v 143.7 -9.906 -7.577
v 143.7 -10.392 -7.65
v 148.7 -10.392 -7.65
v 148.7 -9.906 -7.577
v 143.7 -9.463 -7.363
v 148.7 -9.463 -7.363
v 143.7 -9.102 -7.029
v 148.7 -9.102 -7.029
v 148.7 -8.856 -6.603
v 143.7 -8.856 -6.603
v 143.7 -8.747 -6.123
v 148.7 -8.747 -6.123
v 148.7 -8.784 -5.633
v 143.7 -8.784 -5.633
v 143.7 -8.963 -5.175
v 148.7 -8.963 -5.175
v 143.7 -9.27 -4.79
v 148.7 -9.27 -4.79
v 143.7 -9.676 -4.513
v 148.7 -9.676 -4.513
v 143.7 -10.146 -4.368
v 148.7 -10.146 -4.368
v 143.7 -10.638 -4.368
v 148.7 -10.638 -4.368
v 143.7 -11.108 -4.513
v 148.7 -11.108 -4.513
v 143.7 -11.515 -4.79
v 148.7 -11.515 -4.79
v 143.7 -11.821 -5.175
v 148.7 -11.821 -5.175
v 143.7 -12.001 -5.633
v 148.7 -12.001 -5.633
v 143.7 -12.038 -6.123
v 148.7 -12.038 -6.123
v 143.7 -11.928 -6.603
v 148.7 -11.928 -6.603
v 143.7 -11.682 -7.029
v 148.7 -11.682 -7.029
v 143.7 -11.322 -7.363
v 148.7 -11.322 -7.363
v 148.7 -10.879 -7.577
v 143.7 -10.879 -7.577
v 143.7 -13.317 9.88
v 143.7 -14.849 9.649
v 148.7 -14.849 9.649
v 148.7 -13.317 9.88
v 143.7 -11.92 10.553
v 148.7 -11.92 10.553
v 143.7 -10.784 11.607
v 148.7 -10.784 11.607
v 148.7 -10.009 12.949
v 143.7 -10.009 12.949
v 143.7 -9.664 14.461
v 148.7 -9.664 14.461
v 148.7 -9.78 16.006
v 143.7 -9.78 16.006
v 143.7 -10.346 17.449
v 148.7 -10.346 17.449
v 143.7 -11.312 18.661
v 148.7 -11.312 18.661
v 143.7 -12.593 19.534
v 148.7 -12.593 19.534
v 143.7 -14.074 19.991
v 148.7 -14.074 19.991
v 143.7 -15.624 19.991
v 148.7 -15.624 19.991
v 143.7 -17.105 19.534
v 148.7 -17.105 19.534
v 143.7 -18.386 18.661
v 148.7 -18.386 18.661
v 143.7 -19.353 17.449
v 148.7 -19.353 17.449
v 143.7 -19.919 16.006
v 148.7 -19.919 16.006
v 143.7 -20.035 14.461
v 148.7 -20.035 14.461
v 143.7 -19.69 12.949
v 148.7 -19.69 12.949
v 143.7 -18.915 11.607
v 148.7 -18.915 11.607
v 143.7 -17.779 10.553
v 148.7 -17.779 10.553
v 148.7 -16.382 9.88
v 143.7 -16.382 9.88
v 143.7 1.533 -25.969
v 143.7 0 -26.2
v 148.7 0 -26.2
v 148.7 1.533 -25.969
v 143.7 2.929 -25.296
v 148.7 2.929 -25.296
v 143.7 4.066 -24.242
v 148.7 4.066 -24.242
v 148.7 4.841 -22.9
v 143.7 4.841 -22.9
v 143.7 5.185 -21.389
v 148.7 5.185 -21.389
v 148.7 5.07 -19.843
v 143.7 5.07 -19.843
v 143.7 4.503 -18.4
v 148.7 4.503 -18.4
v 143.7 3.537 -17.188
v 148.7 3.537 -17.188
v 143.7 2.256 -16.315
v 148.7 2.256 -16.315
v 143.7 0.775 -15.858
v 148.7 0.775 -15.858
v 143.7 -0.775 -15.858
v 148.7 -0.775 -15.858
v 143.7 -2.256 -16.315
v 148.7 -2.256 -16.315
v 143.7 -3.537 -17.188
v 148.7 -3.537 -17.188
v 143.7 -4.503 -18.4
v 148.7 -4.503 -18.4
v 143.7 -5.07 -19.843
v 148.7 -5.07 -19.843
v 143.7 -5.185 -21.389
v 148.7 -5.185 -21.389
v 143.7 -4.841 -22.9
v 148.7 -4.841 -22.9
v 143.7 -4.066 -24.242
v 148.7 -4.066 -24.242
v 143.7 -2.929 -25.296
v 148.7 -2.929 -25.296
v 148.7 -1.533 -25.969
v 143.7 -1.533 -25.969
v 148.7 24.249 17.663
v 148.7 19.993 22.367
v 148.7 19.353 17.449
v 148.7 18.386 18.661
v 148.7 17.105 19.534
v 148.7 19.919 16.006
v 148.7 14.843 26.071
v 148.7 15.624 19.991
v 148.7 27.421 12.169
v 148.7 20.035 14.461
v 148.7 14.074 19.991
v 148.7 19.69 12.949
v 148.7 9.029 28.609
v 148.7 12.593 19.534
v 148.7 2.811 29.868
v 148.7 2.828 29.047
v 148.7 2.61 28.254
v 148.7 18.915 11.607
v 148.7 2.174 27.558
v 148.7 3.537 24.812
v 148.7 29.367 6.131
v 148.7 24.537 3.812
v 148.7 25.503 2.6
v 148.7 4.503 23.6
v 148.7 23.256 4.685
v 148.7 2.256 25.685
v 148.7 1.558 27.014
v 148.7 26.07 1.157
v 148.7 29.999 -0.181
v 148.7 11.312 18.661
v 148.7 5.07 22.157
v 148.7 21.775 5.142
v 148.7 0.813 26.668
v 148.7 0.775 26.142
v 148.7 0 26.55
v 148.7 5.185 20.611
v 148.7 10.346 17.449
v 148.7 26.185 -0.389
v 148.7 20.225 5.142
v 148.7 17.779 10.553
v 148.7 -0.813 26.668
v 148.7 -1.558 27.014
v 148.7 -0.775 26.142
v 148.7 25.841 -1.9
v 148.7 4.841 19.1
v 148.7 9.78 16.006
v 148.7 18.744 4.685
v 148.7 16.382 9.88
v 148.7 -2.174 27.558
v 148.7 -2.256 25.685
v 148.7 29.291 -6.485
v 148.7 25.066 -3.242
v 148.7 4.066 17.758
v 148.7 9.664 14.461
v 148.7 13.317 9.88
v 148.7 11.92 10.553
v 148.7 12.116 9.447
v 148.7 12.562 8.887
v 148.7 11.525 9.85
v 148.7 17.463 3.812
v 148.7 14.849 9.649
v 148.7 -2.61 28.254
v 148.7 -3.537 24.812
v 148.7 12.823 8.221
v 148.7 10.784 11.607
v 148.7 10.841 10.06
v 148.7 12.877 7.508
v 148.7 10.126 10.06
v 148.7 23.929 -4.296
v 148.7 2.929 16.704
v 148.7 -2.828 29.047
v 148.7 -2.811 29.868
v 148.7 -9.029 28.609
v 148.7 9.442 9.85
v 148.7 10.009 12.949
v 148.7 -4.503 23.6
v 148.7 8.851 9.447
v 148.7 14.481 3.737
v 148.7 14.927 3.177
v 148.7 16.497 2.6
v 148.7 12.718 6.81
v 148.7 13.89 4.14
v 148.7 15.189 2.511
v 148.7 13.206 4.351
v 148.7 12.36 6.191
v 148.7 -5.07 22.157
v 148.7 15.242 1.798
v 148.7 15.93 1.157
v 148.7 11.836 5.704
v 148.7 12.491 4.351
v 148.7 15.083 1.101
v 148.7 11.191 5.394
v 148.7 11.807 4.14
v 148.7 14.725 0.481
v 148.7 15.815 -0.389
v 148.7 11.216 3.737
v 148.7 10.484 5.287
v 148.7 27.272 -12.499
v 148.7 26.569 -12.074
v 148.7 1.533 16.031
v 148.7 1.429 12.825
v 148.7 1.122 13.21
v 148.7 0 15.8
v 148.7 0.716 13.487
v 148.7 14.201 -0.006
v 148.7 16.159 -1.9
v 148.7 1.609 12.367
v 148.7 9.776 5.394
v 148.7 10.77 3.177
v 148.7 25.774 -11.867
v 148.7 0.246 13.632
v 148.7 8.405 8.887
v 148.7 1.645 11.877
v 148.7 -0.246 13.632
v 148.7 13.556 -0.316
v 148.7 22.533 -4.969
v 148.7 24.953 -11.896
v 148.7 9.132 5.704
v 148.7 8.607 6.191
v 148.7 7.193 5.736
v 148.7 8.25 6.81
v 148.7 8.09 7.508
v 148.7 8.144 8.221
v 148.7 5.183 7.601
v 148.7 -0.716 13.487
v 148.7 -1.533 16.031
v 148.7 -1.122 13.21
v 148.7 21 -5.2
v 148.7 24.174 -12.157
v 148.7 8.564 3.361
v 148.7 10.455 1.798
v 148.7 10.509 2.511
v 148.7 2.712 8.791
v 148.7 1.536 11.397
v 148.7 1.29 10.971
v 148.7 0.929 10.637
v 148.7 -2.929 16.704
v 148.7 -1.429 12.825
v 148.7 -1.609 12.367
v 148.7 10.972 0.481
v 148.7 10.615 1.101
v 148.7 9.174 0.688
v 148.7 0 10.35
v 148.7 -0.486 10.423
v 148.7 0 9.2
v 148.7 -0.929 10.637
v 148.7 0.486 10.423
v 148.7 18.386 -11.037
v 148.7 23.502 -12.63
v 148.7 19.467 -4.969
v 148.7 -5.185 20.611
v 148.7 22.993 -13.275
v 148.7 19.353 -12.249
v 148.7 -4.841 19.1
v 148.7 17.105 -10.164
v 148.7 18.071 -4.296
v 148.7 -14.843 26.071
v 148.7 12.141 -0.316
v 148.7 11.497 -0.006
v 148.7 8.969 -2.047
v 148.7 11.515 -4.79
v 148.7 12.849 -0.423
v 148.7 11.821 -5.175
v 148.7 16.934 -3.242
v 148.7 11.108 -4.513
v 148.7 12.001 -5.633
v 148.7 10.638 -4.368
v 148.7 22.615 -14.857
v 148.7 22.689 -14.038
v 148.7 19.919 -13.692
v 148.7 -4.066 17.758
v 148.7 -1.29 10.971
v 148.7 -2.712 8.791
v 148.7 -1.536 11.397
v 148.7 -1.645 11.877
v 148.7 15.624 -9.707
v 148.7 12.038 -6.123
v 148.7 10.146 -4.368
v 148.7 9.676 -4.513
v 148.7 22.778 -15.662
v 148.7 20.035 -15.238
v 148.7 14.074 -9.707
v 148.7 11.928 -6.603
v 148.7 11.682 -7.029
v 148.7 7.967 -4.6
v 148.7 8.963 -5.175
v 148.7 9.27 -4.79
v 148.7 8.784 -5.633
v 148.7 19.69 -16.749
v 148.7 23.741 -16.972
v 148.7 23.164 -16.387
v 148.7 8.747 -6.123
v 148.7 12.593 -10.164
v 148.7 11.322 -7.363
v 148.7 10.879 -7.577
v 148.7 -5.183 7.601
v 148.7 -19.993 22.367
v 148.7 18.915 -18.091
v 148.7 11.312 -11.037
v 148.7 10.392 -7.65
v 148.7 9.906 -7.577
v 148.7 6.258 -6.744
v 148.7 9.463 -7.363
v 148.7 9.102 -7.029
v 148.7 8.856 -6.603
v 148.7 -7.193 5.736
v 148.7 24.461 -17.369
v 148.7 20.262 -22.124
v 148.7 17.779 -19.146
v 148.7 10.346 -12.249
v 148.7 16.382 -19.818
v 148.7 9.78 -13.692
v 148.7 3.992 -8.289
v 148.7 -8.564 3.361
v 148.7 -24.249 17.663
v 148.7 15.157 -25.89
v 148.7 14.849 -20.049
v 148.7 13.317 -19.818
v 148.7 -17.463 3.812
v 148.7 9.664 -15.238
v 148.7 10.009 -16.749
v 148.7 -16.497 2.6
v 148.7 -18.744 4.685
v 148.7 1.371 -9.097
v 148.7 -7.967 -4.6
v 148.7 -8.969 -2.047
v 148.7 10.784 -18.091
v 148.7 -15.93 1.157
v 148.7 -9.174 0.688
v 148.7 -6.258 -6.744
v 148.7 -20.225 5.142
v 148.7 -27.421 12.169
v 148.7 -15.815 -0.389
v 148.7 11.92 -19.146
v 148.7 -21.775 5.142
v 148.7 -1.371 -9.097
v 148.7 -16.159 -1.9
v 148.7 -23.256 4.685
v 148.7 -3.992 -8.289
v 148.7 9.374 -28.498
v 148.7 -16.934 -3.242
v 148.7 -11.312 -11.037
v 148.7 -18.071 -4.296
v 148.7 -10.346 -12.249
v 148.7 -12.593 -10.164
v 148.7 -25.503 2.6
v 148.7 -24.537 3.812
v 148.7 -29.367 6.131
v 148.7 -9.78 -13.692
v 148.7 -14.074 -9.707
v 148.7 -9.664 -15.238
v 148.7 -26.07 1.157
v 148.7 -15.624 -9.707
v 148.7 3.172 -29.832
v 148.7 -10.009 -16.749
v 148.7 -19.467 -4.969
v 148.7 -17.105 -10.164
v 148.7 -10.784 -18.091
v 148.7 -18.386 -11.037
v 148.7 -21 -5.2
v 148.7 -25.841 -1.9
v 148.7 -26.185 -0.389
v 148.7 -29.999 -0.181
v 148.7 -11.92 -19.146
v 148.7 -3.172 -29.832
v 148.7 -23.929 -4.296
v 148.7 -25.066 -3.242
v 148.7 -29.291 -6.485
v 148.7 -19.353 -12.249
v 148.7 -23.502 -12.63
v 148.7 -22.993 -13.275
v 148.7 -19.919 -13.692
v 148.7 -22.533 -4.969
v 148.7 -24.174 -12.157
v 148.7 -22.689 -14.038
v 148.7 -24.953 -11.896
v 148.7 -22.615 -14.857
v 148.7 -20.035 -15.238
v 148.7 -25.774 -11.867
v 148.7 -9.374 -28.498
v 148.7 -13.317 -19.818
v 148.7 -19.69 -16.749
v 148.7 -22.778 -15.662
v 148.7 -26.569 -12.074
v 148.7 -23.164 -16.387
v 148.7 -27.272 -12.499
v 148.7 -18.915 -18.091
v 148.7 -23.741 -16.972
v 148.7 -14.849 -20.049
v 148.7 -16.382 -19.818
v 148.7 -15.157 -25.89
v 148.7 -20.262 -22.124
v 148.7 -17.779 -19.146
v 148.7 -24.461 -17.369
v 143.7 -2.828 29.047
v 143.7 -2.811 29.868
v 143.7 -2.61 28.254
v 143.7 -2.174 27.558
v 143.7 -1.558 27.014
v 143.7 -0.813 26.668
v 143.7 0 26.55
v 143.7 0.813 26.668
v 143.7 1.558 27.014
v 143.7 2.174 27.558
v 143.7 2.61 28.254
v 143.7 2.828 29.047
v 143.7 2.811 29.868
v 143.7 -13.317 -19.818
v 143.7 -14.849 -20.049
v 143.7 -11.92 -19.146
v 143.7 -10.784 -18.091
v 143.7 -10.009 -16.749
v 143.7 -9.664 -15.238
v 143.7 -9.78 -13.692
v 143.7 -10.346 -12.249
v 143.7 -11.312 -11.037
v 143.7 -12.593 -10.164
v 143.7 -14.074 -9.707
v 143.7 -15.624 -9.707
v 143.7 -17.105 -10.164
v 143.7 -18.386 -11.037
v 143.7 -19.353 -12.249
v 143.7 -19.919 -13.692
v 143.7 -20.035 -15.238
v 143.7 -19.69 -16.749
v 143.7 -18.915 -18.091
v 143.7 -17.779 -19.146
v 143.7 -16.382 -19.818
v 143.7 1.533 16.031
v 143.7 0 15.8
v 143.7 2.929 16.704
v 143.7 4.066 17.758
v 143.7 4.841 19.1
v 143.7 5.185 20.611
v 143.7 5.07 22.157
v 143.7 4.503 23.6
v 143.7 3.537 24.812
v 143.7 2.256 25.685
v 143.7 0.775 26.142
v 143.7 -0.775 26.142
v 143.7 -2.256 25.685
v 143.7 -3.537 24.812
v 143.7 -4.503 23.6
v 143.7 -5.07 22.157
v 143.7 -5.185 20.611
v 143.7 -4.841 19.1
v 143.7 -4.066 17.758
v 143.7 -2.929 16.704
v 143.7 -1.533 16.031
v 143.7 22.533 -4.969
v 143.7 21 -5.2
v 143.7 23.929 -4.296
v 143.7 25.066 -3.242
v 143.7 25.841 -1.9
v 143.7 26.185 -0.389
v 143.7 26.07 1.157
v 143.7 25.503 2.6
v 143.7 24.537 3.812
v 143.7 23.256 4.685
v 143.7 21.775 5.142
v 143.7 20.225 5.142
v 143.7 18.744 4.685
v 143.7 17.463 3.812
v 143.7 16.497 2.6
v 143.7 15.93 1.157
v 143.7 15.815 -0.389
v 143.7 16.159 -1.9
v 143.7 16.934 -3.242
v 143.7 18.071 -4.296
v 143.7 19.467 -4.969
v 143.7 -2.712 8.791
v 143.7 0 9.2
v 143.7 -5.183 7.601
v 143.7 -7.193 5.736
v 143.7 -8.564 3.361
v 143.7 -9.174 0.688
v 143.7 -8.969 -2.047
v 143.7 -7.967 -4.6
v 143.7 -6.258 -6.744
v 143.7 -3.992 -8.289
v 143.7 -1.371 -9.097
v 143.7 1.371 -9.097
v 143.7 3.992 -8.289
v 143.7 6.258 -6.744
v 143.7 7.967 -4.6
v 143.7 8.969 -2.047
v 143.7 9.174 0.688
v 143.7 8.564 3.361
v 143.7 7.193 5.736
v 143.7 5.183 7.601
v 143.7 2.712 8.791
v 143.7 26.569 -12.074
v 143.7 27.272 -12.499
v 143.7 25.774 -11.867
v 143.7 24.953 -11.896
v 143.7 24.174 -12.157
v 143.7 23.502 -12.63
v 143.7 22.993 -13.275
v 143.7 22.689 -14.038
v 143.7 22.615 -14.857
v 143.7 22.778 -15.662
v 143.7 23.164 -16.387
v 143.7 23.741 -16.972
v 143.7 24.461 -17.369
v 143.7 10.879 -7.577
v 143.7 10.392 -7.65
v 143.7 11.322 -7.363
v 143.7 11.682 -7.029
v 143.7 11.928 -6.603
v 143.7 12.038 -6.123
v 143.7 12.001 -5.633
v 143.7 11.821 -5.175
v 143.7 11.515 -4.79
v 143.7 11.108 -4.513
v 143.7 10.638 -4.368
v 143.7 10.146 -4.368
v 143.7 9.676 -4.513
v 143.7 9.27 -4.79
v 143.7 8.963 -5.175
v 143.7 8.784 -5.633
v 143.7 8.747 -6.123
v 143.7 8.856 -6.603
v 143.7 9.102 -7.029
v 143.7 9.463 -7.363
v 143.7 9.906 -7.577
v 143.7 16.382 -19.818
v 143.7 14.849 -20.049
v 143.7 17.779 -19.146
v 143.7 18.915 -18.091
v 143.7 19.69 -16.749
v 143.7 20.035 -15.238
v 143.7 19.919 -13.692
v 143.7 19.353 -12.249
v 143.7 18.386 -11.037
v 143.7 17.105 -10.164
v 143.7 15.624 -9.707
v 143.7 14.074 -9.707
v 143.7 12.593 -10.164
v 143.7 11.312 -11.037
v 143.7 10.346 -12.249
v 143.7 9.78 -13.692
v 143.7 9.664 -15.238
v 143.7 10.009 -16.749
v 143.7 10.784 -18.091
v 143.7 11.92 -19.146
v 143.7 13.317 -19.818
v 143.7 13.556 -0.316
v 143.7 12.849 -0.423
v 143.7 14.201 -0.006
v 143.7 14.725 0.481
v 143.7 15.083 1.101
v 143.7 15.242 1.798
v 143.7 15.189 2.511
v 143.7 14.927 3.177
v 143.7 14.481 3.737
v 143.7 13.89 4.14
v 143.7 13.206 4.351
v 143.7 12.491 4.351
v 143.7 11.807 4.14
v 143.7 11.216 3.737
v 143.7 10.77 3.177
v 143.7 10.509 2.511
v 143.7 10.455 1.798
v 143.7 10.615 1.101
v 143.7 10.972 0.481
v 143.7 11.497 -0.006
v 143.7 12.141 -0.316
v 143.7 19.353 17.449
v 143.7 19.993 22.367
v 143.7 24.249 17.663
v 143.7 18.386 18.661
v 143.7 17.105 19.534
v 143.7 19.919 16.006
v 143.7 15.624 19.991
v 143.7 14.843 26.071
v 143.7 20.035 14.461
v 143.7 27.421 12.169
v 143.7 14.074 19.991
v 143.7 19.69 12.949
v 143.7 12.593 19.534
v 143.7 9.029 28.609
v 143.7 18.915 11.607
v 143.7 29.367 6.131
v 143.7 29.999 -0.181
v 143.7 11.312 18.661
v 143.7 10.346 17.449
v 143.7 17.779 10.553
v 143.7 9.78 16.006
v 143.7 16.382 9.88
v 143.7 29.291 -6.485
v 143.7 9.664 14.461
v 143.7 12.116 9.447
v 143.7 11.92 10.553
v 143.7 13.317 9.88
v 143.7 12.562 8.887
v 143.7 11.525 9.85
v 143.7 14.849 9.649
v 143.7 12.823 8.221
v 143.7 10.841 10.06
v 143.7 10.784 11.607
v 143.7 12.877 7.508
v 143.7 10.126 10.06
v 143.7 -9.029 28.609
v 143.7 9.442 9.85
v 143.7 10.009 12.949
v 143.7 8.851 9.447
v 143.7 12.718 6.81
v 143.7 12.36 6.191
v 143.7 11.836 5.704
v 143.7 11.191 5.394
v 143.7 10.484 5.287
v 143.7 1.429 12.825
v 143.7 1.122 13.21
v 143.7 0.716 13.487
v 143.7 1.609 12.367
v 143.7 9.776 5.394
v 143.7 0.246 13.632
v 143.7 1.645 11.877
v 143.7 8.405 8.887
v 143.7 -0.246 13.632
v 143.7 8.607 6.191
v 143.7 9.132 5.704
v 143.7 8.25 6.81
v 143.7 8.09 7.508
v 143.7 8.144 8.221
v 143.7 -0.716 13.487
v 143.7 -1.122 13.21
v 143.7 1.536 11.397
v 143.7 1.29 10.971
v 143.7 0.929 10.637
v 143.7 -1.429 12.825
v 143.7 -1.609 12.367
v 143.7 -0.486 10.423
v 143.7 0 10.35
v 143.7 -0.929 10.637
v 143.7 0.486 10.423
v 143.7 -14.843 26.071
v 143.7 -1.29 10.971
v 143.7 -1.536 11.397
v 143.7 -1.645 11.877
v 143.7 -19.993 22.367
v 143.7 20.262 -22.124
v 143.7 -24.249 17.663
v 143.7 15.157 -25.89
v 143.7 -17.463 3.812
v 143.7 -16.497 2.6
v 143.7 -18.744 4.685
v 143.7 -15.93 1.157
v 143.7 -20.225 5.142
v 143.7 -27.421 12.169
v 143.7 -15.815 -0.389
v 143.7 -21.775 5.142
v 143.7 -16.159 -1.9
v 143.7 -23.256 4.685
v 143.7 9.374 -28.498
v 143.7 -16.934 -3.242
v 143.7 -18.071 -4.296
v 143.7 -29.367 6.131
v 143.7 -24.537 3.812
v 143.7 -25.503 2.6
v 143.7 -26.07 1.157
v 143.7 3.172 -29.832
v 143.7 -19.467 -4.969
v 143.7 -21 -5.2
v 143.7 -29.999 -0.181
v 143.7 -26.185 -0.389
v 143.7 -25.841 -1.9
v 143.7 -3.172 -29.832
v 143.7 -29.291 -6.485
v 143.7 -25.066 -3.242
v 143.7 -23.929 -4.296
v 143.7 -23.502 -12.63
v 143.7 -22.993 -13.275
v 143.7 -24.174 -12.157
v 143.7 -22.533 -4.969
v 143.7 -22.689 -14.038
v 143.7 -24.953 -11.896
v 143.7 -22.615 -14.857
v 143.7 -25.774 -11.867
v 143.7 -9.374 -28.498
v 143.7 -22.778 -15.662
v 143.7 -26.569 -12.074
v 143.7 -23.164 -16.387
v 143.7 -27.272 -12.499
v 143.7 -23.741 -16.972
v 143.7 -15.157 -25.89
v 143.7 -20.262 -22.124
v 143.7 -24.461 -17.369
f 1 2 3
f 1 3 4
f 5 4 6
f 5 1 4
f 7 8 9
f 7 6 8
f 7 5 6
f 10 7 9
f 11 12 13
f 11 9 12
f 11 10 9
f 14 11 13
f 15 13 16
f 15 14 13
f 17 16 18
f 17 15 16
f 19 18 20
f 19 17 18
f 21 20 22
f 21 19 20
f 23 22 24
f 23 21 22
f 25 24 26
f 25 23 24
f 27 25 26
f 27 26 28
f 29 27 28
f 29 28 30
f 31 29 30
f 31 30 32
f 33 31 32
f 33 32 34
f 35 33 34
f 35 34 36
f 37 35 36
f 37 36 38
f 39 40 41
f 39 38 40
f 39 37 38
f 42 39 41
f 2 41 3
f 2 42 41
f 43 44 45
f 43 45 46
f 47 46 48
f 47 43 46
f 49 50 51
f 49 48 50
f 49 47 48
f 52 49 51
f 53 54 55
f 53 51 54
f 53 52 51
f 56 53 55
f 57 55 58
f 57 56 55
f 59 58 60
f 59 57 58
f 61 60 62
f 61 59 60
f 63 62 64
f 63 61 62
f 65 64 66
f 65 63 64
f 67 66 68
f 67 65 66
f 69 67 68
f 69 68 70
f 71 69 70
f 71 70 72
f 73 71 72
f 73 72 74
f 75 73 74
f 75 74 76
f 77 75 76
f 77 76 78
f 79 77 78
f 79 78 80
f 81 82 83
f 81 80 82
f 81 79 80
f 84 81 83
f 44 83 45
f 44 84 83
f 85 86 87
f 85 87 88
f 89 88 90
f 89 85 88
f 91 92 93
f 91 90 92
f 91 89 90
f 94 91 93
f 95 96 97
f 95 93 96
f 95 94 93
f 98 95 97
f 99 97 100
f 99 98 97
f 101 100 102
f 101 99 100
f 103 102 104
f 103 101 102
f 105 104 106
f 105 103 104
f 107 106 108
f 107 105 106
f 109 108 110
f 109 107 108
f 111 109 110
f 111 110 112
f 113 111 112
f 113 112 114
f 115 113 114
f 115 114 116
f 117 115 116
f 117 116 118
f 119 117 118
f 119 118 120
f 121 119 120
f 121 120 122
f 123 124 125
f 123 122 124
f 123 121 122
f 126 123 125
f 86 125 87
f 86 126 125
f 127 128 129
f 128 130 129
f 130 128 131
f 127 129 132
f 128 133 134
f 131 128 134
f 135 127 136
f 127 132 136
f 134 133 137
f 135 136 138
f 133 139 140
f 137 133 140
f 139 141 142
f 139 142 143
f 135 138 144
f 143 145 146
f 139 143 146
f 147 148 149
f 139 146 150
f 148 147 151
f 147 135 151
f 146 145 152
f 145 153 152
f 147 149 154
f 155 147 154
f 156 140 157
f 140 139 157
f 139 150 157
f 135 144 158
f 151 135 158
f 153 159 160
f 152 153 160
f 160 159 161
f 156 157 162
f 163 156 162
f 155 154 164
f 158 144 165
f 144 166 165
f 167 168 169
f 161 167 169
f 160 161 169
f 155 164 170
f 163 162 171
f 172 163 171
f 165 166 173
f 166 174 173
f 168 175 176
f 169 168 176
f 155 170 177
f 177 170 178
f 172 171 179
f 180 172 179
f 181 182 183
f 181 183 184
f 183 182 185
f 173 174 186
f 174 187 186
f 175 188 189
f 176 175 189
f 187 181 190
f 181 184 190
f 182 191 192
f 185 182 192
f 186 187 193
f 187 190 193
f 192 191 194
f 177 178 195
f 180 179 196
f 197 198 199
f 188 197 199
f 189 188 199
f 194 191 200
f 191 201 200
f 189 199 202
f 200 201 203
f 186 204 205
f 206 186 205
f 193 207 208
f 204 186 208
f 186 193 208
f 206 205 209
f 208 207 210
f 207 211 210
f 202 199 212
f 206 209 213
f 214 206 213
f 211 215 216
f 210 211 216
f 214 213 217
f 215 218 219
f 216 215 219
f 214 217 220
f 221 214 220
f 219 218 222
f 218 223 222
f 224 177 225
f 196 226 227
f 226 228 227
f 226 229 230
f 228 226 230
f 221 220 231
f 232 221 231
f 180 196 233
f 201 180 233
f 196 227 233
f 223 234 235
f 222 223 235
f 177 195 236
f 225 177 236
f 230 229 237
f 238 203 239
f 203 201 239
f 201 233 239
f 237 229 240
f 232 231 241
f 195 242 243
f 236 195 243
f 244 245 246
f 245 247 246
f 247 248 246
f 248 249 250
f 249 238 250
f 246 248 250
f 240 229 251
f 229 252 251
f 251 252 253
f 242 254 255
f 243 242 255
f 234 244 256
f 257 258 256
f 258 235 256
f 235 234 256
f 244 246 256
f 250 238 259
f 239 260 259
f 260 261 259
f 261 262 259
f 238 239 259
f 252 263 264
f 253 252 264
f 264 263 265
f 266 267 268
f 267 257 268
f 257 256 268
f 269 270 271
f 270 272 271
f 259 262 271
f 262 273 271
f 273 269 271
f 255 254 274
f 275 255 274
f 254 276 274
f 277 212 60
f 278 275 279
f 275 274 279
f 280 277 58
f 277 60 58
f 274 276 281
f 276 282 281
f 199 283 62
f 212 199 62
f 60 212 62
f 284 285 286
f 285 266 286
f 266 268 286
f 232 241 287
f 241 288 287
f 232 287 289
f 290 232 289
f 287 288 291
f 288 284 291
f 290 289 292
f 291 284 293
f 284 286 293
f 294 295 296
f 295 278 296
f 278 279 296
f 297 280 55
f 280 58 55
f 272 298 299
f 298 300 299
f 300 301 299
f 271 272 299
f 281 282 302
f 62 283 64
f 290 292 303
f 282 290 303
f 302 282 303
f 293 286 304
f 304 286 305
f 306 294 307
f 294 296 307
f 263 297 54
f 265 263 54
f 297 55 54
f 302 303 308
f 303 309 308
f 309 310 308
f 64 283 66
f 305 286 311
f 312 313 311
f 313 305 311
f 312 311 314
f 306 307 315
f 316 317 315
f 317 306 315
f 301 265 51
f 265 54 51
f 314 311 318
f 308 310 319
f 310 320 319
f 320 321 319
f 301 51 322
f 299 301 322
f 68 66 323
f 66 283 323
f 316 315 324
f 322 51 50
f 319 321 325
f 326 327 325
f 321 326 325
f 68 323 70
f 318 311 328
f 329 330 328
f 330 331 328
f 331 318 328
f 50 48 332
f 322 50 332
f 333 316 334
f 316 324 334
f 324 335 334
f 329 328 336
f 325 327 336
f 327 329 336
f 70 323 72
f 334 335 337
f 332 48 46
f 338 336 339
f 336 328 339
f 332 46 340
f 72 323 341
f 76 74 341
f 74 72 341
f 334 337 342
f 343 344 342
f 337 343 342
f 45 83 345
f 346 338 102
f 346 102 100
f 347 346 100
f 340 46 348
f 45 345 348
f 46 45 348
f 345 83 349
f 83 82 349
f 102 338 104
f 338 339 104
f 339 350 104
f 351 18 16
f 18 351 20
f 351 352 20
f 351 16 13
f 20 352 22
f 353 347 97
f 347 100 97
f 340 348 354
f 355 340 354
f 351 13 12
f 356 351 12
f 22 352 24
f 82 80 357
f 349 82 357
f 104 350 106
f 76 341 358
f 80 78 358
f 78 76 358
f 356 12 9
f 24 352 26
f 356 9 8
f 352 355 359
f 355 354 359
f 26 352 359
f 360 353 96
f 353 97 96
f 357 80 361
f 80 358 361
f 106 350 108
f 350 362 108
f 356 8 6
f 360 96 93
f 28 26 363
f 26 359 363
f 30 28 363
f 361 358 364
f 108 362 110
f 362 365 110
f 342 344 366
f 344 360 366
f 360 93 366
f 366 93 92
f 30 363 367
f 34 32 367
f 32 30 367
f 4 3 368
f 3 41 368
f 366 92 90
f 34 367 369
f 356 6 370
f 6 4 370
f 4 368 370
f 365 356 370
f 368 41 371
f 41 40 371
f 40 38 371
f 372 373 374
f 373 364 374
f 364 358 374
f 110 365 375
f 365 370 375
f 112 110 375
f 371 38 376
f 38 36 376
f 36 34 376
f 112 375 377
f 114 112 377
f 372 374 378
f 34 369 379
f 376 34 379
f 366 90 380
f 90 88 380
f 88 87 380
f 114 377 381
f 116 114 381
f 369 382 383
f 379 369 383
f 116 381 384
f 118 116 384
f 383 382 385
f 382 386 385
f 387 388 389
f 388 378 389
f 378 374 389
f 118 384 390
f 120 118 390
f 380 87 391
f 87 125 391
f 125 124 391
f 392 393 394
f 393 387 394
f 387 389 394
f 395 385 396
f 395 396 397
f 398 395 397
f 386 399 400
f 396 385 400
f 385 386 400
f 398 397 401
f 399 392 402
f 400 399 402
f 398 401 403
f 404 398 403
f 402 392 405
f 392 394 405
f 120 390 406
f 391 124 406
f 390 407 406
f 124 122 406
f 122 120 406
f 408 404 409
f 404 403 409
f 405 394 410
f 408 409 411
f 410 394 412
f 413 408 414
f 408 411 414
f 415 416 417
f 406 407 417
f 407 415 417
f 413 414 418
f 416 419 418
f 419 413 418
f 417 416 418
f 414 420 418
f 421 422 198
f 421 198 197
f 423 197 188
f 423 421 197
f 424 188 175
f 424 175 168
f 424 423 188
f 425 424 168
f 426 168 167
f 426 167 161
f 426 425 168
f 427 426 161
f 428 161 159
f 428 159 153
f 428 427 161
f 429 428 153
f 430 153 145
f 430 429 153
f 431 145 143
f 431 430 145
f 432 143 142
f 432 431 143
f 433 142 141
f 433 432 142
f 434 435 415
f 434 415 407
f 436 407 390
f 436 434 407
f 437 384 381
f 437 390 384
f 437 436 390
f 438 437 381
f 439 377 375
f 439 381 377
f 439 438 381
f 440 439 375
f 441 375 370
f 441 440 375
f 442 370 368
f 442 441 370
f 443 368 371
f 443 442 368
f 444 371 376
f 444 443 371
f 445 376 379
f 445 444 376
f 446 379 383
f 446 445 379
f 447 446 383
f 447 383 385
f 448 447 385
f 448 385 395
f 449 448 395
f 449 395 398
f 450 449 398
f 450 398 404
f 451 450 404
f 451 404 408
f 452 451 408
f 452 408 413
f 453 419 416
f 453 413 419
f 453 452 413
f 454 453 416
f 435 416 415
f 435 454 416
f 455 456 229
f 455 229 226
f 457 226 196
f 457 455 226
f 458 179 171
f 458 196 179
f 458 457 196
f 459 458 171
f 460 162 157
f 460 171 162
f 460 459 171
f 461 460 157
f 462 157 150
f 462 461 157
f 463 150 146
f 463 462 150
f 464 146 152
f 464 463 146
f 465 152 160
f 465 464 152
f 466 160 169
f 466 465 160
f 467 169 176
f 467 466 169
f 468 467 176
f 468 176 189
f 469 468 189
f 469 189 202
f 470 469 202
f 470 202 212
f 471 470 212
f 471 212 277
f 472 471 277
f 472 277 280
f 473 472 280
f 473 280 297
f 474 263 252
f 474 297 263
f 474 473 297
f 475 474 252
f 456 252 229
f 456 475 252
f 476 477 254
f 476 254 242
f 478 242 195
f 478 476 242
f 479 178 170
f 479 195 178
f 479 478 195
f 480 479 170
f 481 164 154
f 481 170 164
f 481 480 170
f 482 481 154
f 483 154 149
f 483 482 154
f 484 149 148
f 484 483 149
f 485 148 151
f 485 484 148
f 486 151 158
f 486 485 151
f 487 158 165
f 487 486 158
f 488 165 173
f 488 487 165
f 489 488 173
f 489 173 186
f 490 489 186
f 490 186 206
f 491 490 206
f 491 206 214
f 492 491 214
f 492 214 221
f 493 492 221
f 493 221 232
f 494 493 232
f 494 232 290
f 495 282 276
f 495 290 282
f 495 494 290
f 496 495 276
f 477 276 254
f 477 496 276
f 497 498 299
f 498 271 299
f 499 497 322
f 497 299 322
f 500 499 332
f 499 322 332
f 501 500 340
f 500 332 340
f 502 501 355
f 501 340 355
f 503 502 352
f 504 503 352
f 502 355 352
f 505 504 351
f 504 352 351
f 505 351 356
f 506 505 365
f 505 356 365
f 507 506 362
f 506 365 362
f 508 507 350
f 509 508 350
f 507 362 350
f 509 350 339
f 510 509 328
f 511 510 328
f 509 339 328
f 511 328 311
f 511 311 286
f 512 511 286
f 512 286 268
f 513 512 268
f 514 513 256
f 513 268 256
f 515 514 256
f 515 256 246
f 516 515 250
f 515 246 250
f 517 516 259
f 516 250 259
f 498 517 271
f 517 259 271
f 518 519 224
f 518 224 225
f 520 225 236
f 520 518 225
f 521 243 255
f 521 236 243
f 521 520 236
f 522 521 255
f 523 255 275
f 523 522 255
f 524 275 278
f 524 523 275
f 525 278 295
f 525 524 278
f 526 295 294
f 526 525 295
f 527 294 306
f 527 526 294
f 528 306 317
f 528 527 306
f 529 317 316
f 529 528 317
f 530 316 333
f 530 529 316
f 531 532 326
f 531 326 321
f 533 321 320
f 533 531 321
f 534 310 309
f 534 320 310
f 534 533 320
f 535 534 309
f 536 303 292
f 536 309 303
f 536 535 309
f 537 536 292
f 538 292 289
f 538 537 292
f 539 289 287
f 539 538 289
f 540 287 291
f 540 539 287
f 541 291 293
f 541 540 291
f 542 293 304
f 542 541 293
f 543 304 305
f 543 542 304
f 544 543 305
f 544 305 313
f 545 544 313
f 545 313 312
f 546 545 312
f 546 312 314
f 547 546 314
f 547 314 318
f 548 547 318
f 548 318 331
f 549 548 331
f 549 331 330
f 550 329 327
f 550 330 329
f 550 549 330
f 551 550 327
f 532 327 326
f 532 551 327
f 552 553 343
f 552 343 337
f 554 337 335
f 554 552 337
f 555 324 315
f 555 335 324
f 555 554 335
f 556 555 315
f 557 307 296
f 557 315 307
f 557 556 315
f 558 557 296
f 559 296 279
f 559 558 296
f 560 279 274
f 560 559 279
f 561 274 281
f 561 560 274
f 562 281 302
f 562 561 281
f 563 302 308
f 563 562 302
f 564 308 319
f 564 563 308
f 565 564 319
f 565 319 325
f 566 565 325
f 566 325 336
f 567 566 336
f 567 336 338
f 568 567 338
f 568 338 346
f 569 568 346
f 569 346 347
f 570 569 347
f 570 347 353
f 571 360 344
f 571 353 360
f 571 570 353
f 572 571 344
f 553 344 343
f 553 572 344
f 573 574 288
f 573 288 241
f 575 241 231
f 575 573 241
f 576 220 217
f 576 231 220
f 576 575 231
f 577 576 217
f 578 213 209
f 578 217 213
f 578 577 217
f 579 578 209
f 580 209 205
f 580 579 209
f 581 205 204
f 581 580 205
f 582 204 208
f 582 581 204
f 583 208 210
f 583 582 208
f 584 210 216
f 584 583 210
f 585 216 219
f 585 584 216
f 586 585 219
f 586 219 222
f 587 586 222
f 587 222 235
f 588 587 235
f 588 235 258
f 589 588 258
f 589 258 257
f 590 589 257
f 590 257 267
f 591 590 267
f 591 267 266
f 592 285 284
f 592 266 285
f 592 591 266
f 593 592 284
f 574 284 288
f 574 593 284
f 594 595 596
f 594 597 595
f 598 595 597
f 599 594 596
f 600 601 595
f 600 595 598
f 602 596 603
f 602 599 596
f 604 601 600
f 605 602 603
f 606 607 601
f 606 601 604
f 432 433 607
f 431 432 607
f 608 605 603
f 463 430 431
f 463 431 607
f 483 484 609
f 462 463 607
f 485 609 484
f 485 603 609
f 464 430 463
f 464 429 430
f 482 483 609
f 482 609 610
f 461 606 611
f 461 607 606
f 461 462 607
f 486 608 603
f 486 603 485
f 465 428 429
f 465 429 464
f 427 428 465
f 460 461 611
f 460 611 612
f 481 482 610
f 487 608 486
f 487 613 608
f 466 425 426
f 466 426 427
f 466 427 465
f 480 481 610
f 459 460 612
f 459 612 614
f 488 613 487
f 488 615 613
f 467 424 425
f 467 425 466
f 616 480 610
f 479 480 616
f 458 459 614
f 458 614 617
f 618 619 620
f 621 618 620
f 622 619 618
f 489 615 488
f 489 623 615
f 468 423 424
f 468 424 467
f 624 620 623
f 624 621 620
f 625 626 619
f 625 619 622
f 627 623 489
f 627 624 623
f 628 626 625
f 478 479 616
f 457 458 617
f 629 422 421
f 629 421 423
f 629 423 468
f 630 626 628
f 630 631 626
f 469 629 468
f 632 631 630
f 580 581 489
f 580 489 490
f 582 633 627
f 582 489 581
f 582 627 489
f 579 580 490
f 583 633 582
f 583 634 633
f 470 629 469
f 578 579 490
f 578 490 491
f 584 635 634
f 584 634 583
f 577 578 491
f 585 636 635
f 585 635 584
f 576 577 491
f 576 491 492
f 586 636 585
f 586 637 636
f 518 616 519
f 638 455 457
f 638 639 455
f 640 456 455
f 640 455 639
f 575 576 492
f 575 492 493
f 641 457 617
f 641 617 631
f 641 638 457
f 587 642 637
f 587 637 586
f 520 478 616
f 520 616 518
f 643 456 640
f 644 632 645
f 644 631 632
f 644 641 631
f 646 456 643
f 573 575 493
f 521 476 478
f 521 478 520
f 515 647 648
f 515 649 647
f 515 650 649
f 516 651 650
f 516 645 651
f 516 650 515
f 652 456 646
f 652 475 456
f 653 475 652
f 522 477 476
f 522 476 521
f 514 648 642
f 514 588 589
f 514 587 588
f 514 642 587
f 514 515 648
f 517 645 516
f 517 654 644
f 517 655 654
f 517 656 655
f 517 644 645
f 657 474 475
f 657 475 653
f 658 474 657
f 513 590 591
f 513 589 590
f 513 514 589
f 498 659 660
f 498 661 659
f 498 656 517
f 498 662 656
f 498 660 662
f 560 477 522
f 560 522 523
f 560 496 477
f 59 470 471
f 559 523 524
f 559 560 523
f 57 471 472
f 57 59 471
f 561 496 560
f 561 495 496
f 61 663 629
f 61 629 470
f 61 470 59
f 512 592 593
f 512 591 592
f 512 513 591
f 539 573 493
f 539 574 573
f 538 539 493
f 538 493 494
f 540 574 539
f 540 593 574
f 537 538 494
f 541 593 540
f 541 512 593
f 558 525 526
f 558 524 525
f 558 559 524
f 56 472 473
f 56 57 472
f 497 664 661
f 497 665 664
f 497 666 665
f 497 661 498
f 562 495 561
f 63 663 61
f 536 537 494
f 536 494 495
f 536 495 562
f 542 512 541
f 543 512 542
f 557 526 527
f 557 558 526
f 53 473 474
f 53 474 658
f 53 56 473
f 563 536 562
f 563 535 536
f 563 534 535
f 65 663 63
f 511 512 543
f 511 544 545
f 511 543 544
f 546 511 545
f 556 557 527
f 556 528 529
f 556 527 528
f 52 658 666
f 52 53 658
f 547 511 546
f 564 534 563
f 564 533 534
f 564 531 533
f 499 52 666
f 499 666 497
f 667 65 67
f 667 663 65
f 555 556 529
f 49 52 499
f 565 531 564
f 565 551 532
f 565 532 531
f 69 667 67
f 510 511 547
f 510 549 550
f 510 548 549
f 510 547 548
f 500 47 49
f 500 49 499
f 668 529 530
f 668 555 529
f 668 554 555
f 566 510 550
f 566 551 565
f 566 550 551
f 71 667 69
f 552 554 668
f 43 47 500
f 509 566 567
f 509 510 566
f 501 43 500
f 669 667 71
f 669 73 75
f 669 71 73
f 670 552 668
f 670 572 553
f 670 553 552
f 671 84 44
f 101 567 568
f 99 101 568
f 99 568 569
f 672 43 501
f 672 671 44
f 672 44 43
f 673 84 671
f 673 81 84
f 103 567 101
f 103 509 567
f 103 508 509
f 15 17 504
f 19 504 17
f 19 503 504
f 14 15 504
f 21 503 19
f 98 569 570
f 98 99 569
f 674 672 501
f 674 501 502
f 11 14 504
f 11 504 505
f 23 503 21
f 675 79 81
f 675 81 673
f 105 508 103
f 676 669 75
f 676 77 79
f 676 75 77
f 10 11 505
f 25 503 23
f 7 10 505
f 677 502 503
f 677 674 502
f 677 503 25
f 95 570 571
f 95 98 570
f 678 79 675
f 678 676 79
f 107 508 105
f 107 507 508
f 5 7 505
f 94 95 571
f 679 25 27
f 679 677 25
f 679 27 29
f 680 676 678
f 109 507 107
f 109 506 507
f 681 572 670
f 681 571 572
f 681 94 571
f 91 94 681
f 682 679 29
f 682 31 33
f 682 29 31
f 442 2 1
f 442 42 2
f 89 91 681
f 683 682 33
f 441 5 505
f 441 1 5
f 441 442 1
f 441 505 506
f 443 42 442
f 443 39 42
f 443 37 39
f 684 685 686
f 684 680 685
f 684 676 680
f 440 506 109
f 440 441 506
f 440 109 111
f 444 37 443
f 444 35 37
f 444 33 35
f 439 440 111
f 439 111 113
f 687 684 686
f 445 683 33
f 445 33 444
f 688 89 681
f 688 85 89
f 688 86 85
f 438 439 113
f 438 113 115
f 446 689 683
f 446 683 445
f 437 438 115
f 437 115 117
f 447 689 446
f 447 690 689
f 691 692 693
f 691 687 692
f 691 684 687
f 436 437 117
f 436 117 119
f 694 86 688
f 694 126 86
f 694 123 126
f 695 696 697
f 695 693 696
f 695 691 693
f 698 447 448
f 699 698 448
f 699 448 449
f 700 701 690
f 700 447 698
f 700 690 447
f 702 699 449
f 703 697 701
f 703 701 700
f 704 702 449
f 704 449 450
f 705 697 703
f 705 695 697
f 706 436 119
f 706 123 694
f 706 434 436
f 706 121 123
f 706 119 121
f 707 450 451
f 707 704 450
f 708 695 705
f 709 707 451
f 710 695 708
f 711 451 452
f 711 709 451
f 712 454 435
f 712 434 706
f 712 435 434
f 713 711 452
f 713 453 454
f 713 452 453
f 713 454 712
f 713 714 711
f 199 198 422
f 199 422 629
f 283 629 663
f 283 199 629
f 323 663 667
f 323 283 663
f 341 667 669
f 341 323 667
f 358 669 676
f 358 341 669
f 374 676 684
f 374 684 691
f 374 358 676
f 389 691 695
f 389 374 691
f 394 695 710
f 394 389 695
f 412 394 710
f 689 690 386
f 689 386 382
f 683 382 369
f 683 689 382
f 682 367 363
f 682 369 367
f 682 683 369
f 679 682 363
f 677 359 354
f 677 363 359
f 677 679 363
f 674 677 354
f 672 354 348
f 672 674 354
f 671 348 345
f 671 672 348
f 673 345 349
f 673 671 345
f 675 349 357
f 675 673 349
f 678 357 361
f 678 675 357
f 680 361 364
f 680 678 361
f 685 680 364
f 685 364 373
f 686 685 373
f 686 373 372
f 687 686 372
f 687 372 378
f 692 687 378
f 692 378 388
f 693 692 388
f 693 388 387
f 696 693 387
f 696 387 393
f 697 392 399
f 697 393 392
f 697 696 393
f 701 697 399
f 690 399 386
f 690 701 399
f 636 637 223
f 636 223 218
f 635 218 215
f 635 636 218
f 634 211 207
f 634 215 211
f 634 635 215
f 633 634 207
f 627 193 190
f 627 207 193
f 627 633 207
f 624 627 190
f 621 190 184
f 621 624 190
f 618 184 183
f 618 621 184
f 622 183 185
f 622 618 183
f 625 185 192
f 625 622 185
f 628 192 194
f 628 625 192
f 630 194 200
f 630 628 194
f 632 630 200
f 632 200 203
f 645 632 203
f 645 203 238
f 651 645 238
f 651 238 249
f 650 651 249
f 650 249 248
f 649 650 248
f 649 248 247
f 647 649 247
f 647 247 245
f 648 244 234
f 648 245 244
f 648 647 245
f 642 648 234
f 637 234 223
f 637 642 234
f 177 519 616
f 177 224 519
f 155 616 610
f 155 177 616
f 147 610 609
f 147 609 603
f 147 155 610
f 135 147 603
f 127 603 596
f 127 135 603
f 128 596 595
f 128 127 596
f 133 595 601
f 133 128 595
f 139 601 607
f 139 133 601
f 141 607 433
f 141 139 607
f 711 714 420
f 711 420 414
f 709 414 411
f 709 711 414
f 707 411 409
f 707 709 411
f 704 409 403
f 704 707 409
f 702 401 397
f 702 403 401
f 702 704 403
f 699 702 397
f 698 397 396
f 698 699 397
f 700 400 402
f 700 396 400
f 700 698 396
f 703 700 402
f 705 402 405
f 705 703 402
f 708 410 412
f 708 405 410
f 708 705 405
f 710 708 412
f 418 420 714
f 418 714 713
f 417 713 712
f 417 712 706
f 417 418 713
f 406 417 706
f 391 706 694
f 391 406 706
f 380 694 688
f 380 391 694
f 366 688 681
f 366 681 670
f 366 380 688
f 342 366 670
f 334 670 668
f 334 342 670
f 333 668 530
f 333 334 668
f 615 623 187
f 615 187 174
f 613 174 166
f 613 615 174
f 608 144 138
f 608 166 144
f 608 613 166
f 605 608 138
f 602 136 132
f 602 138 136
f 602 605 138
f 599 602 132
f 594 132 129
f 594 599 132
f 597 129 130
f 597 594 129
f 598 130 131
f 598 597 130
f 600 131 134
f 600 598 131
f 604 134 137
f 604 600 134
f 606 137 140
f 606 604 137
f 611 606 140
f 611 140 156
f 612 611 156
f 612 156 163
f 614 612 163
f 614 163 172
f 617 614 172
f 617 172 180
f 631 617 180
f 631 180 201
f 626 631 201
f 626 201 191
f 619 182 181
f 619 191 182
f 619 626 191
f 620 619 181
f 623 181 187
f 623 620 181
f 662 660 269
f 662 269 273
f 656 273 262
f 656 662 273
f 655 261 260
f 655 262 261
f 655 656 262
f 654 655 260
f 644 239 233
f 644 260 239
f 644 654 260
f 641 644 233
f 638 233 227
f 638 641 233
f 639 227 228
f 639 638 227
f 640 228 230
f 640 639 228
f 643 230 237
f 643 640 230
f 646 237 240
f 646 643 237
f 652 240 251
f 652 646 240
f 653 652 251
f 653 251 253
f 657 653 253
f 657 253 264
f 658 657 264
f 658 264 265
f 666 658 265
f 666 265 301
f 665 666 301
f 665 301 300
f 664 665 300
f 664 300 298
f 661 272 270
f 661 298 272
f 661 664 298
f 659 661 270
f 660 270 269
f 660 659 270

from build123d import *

# Parameters (mm, degrees)
AXIAL_PROFILE_MM_W     = 5
AXIAL_PROFILE_MM_H     = 20.8
AXIAL_HOLES_DEPTH      = 155.634051877
AXIAL_HOLES_DEPTH_BACK = 155.634051877
SKETCH2_R              = 5.2
SKETCH2_R_2            = 2.4
SKETCH2_R_3            = 1.65
SKETCH2_R_4            = 2.85


with BuildPart() as part:
    # Axial profile (mm) → Full revolution (revolve)
    with BuildSketch(Plane.XY, mode=Mode.PRIVATE) as full_revolution_sk:
        with Locations((146.2, 19.6)):
            Rectangle(AXIAL_PROFILE_MM_W, AXIAL_PROFILE_MM_H)
    revolve(full_revolution_sk.sketch.rotate(Axis((-110, 0, 0), (1, 0, 0)), 90), axis=Axis((-110, 0, 0), (1, 0, 0)))

    # Sketch2 → Axial holes (cut, two sides: drawn at the far end of the back side and taken through both)
    with BuildSketch(Plane(origin=(0, 0, 0), x_dir=(0, 0, -1), z_dir=(1, 0, 0)).offset(-AXIAL_HOLES_DEPTH_BACK)):
        with Locations((0, 21)):
            Circle(SKETCH2_R)
        with Locations((-14.849242405, 14.849242405)):
            Circle(SKETCH2_R)
        with Locations((-21, 0)):
            Circle(SKETCH2_R)
        with Locations((-14.849242405, -14.849242405)):
            Circle(SKETCH2_R)
        with Locations((0, -21)):
            Circle(SKETCH2_R)
        with Locations((14.849242405, -14.849242405)):
            Circle(SKETCH2_R)
        with Locations((21, 0)):
            Circle(SKETCH2_R)
        with Locations((14.849242405, 14.849242405)):
            Circle(SKETCH2_R)
        with Locations((-1.977382665, 12.848733704)):
            Circle(SKETCH2_R_2)
        with Locations((-7.687206041, 10.483647423)):
            Circle(SKETCH2_R_2)
        with Locations((-12, 0)):
            Circle(SKETCH2_R_3)
        with Locations((6, -10.392304845)):
            Circle(SKETCH2_R_3)
        with Locations((6, 10.392304845)):
            Circle(SKETCH2_R_3)
        with Locations((-29.4, 0)):
            Circle(SKETCH2_R_4)
        with Locations((14.7, -25.461146871)):
            Circle(SKETCH2_R_4)
        with Locations((14.7, 25.461146871)):
            Circle(SKETCH2_R_4)
    extrude(amount=AXIAL_HOLES_DEPTH + AXIAL_HOLES_DEPTH_BACK, mode=Mode.SUBTRACT)


solid = part.part
